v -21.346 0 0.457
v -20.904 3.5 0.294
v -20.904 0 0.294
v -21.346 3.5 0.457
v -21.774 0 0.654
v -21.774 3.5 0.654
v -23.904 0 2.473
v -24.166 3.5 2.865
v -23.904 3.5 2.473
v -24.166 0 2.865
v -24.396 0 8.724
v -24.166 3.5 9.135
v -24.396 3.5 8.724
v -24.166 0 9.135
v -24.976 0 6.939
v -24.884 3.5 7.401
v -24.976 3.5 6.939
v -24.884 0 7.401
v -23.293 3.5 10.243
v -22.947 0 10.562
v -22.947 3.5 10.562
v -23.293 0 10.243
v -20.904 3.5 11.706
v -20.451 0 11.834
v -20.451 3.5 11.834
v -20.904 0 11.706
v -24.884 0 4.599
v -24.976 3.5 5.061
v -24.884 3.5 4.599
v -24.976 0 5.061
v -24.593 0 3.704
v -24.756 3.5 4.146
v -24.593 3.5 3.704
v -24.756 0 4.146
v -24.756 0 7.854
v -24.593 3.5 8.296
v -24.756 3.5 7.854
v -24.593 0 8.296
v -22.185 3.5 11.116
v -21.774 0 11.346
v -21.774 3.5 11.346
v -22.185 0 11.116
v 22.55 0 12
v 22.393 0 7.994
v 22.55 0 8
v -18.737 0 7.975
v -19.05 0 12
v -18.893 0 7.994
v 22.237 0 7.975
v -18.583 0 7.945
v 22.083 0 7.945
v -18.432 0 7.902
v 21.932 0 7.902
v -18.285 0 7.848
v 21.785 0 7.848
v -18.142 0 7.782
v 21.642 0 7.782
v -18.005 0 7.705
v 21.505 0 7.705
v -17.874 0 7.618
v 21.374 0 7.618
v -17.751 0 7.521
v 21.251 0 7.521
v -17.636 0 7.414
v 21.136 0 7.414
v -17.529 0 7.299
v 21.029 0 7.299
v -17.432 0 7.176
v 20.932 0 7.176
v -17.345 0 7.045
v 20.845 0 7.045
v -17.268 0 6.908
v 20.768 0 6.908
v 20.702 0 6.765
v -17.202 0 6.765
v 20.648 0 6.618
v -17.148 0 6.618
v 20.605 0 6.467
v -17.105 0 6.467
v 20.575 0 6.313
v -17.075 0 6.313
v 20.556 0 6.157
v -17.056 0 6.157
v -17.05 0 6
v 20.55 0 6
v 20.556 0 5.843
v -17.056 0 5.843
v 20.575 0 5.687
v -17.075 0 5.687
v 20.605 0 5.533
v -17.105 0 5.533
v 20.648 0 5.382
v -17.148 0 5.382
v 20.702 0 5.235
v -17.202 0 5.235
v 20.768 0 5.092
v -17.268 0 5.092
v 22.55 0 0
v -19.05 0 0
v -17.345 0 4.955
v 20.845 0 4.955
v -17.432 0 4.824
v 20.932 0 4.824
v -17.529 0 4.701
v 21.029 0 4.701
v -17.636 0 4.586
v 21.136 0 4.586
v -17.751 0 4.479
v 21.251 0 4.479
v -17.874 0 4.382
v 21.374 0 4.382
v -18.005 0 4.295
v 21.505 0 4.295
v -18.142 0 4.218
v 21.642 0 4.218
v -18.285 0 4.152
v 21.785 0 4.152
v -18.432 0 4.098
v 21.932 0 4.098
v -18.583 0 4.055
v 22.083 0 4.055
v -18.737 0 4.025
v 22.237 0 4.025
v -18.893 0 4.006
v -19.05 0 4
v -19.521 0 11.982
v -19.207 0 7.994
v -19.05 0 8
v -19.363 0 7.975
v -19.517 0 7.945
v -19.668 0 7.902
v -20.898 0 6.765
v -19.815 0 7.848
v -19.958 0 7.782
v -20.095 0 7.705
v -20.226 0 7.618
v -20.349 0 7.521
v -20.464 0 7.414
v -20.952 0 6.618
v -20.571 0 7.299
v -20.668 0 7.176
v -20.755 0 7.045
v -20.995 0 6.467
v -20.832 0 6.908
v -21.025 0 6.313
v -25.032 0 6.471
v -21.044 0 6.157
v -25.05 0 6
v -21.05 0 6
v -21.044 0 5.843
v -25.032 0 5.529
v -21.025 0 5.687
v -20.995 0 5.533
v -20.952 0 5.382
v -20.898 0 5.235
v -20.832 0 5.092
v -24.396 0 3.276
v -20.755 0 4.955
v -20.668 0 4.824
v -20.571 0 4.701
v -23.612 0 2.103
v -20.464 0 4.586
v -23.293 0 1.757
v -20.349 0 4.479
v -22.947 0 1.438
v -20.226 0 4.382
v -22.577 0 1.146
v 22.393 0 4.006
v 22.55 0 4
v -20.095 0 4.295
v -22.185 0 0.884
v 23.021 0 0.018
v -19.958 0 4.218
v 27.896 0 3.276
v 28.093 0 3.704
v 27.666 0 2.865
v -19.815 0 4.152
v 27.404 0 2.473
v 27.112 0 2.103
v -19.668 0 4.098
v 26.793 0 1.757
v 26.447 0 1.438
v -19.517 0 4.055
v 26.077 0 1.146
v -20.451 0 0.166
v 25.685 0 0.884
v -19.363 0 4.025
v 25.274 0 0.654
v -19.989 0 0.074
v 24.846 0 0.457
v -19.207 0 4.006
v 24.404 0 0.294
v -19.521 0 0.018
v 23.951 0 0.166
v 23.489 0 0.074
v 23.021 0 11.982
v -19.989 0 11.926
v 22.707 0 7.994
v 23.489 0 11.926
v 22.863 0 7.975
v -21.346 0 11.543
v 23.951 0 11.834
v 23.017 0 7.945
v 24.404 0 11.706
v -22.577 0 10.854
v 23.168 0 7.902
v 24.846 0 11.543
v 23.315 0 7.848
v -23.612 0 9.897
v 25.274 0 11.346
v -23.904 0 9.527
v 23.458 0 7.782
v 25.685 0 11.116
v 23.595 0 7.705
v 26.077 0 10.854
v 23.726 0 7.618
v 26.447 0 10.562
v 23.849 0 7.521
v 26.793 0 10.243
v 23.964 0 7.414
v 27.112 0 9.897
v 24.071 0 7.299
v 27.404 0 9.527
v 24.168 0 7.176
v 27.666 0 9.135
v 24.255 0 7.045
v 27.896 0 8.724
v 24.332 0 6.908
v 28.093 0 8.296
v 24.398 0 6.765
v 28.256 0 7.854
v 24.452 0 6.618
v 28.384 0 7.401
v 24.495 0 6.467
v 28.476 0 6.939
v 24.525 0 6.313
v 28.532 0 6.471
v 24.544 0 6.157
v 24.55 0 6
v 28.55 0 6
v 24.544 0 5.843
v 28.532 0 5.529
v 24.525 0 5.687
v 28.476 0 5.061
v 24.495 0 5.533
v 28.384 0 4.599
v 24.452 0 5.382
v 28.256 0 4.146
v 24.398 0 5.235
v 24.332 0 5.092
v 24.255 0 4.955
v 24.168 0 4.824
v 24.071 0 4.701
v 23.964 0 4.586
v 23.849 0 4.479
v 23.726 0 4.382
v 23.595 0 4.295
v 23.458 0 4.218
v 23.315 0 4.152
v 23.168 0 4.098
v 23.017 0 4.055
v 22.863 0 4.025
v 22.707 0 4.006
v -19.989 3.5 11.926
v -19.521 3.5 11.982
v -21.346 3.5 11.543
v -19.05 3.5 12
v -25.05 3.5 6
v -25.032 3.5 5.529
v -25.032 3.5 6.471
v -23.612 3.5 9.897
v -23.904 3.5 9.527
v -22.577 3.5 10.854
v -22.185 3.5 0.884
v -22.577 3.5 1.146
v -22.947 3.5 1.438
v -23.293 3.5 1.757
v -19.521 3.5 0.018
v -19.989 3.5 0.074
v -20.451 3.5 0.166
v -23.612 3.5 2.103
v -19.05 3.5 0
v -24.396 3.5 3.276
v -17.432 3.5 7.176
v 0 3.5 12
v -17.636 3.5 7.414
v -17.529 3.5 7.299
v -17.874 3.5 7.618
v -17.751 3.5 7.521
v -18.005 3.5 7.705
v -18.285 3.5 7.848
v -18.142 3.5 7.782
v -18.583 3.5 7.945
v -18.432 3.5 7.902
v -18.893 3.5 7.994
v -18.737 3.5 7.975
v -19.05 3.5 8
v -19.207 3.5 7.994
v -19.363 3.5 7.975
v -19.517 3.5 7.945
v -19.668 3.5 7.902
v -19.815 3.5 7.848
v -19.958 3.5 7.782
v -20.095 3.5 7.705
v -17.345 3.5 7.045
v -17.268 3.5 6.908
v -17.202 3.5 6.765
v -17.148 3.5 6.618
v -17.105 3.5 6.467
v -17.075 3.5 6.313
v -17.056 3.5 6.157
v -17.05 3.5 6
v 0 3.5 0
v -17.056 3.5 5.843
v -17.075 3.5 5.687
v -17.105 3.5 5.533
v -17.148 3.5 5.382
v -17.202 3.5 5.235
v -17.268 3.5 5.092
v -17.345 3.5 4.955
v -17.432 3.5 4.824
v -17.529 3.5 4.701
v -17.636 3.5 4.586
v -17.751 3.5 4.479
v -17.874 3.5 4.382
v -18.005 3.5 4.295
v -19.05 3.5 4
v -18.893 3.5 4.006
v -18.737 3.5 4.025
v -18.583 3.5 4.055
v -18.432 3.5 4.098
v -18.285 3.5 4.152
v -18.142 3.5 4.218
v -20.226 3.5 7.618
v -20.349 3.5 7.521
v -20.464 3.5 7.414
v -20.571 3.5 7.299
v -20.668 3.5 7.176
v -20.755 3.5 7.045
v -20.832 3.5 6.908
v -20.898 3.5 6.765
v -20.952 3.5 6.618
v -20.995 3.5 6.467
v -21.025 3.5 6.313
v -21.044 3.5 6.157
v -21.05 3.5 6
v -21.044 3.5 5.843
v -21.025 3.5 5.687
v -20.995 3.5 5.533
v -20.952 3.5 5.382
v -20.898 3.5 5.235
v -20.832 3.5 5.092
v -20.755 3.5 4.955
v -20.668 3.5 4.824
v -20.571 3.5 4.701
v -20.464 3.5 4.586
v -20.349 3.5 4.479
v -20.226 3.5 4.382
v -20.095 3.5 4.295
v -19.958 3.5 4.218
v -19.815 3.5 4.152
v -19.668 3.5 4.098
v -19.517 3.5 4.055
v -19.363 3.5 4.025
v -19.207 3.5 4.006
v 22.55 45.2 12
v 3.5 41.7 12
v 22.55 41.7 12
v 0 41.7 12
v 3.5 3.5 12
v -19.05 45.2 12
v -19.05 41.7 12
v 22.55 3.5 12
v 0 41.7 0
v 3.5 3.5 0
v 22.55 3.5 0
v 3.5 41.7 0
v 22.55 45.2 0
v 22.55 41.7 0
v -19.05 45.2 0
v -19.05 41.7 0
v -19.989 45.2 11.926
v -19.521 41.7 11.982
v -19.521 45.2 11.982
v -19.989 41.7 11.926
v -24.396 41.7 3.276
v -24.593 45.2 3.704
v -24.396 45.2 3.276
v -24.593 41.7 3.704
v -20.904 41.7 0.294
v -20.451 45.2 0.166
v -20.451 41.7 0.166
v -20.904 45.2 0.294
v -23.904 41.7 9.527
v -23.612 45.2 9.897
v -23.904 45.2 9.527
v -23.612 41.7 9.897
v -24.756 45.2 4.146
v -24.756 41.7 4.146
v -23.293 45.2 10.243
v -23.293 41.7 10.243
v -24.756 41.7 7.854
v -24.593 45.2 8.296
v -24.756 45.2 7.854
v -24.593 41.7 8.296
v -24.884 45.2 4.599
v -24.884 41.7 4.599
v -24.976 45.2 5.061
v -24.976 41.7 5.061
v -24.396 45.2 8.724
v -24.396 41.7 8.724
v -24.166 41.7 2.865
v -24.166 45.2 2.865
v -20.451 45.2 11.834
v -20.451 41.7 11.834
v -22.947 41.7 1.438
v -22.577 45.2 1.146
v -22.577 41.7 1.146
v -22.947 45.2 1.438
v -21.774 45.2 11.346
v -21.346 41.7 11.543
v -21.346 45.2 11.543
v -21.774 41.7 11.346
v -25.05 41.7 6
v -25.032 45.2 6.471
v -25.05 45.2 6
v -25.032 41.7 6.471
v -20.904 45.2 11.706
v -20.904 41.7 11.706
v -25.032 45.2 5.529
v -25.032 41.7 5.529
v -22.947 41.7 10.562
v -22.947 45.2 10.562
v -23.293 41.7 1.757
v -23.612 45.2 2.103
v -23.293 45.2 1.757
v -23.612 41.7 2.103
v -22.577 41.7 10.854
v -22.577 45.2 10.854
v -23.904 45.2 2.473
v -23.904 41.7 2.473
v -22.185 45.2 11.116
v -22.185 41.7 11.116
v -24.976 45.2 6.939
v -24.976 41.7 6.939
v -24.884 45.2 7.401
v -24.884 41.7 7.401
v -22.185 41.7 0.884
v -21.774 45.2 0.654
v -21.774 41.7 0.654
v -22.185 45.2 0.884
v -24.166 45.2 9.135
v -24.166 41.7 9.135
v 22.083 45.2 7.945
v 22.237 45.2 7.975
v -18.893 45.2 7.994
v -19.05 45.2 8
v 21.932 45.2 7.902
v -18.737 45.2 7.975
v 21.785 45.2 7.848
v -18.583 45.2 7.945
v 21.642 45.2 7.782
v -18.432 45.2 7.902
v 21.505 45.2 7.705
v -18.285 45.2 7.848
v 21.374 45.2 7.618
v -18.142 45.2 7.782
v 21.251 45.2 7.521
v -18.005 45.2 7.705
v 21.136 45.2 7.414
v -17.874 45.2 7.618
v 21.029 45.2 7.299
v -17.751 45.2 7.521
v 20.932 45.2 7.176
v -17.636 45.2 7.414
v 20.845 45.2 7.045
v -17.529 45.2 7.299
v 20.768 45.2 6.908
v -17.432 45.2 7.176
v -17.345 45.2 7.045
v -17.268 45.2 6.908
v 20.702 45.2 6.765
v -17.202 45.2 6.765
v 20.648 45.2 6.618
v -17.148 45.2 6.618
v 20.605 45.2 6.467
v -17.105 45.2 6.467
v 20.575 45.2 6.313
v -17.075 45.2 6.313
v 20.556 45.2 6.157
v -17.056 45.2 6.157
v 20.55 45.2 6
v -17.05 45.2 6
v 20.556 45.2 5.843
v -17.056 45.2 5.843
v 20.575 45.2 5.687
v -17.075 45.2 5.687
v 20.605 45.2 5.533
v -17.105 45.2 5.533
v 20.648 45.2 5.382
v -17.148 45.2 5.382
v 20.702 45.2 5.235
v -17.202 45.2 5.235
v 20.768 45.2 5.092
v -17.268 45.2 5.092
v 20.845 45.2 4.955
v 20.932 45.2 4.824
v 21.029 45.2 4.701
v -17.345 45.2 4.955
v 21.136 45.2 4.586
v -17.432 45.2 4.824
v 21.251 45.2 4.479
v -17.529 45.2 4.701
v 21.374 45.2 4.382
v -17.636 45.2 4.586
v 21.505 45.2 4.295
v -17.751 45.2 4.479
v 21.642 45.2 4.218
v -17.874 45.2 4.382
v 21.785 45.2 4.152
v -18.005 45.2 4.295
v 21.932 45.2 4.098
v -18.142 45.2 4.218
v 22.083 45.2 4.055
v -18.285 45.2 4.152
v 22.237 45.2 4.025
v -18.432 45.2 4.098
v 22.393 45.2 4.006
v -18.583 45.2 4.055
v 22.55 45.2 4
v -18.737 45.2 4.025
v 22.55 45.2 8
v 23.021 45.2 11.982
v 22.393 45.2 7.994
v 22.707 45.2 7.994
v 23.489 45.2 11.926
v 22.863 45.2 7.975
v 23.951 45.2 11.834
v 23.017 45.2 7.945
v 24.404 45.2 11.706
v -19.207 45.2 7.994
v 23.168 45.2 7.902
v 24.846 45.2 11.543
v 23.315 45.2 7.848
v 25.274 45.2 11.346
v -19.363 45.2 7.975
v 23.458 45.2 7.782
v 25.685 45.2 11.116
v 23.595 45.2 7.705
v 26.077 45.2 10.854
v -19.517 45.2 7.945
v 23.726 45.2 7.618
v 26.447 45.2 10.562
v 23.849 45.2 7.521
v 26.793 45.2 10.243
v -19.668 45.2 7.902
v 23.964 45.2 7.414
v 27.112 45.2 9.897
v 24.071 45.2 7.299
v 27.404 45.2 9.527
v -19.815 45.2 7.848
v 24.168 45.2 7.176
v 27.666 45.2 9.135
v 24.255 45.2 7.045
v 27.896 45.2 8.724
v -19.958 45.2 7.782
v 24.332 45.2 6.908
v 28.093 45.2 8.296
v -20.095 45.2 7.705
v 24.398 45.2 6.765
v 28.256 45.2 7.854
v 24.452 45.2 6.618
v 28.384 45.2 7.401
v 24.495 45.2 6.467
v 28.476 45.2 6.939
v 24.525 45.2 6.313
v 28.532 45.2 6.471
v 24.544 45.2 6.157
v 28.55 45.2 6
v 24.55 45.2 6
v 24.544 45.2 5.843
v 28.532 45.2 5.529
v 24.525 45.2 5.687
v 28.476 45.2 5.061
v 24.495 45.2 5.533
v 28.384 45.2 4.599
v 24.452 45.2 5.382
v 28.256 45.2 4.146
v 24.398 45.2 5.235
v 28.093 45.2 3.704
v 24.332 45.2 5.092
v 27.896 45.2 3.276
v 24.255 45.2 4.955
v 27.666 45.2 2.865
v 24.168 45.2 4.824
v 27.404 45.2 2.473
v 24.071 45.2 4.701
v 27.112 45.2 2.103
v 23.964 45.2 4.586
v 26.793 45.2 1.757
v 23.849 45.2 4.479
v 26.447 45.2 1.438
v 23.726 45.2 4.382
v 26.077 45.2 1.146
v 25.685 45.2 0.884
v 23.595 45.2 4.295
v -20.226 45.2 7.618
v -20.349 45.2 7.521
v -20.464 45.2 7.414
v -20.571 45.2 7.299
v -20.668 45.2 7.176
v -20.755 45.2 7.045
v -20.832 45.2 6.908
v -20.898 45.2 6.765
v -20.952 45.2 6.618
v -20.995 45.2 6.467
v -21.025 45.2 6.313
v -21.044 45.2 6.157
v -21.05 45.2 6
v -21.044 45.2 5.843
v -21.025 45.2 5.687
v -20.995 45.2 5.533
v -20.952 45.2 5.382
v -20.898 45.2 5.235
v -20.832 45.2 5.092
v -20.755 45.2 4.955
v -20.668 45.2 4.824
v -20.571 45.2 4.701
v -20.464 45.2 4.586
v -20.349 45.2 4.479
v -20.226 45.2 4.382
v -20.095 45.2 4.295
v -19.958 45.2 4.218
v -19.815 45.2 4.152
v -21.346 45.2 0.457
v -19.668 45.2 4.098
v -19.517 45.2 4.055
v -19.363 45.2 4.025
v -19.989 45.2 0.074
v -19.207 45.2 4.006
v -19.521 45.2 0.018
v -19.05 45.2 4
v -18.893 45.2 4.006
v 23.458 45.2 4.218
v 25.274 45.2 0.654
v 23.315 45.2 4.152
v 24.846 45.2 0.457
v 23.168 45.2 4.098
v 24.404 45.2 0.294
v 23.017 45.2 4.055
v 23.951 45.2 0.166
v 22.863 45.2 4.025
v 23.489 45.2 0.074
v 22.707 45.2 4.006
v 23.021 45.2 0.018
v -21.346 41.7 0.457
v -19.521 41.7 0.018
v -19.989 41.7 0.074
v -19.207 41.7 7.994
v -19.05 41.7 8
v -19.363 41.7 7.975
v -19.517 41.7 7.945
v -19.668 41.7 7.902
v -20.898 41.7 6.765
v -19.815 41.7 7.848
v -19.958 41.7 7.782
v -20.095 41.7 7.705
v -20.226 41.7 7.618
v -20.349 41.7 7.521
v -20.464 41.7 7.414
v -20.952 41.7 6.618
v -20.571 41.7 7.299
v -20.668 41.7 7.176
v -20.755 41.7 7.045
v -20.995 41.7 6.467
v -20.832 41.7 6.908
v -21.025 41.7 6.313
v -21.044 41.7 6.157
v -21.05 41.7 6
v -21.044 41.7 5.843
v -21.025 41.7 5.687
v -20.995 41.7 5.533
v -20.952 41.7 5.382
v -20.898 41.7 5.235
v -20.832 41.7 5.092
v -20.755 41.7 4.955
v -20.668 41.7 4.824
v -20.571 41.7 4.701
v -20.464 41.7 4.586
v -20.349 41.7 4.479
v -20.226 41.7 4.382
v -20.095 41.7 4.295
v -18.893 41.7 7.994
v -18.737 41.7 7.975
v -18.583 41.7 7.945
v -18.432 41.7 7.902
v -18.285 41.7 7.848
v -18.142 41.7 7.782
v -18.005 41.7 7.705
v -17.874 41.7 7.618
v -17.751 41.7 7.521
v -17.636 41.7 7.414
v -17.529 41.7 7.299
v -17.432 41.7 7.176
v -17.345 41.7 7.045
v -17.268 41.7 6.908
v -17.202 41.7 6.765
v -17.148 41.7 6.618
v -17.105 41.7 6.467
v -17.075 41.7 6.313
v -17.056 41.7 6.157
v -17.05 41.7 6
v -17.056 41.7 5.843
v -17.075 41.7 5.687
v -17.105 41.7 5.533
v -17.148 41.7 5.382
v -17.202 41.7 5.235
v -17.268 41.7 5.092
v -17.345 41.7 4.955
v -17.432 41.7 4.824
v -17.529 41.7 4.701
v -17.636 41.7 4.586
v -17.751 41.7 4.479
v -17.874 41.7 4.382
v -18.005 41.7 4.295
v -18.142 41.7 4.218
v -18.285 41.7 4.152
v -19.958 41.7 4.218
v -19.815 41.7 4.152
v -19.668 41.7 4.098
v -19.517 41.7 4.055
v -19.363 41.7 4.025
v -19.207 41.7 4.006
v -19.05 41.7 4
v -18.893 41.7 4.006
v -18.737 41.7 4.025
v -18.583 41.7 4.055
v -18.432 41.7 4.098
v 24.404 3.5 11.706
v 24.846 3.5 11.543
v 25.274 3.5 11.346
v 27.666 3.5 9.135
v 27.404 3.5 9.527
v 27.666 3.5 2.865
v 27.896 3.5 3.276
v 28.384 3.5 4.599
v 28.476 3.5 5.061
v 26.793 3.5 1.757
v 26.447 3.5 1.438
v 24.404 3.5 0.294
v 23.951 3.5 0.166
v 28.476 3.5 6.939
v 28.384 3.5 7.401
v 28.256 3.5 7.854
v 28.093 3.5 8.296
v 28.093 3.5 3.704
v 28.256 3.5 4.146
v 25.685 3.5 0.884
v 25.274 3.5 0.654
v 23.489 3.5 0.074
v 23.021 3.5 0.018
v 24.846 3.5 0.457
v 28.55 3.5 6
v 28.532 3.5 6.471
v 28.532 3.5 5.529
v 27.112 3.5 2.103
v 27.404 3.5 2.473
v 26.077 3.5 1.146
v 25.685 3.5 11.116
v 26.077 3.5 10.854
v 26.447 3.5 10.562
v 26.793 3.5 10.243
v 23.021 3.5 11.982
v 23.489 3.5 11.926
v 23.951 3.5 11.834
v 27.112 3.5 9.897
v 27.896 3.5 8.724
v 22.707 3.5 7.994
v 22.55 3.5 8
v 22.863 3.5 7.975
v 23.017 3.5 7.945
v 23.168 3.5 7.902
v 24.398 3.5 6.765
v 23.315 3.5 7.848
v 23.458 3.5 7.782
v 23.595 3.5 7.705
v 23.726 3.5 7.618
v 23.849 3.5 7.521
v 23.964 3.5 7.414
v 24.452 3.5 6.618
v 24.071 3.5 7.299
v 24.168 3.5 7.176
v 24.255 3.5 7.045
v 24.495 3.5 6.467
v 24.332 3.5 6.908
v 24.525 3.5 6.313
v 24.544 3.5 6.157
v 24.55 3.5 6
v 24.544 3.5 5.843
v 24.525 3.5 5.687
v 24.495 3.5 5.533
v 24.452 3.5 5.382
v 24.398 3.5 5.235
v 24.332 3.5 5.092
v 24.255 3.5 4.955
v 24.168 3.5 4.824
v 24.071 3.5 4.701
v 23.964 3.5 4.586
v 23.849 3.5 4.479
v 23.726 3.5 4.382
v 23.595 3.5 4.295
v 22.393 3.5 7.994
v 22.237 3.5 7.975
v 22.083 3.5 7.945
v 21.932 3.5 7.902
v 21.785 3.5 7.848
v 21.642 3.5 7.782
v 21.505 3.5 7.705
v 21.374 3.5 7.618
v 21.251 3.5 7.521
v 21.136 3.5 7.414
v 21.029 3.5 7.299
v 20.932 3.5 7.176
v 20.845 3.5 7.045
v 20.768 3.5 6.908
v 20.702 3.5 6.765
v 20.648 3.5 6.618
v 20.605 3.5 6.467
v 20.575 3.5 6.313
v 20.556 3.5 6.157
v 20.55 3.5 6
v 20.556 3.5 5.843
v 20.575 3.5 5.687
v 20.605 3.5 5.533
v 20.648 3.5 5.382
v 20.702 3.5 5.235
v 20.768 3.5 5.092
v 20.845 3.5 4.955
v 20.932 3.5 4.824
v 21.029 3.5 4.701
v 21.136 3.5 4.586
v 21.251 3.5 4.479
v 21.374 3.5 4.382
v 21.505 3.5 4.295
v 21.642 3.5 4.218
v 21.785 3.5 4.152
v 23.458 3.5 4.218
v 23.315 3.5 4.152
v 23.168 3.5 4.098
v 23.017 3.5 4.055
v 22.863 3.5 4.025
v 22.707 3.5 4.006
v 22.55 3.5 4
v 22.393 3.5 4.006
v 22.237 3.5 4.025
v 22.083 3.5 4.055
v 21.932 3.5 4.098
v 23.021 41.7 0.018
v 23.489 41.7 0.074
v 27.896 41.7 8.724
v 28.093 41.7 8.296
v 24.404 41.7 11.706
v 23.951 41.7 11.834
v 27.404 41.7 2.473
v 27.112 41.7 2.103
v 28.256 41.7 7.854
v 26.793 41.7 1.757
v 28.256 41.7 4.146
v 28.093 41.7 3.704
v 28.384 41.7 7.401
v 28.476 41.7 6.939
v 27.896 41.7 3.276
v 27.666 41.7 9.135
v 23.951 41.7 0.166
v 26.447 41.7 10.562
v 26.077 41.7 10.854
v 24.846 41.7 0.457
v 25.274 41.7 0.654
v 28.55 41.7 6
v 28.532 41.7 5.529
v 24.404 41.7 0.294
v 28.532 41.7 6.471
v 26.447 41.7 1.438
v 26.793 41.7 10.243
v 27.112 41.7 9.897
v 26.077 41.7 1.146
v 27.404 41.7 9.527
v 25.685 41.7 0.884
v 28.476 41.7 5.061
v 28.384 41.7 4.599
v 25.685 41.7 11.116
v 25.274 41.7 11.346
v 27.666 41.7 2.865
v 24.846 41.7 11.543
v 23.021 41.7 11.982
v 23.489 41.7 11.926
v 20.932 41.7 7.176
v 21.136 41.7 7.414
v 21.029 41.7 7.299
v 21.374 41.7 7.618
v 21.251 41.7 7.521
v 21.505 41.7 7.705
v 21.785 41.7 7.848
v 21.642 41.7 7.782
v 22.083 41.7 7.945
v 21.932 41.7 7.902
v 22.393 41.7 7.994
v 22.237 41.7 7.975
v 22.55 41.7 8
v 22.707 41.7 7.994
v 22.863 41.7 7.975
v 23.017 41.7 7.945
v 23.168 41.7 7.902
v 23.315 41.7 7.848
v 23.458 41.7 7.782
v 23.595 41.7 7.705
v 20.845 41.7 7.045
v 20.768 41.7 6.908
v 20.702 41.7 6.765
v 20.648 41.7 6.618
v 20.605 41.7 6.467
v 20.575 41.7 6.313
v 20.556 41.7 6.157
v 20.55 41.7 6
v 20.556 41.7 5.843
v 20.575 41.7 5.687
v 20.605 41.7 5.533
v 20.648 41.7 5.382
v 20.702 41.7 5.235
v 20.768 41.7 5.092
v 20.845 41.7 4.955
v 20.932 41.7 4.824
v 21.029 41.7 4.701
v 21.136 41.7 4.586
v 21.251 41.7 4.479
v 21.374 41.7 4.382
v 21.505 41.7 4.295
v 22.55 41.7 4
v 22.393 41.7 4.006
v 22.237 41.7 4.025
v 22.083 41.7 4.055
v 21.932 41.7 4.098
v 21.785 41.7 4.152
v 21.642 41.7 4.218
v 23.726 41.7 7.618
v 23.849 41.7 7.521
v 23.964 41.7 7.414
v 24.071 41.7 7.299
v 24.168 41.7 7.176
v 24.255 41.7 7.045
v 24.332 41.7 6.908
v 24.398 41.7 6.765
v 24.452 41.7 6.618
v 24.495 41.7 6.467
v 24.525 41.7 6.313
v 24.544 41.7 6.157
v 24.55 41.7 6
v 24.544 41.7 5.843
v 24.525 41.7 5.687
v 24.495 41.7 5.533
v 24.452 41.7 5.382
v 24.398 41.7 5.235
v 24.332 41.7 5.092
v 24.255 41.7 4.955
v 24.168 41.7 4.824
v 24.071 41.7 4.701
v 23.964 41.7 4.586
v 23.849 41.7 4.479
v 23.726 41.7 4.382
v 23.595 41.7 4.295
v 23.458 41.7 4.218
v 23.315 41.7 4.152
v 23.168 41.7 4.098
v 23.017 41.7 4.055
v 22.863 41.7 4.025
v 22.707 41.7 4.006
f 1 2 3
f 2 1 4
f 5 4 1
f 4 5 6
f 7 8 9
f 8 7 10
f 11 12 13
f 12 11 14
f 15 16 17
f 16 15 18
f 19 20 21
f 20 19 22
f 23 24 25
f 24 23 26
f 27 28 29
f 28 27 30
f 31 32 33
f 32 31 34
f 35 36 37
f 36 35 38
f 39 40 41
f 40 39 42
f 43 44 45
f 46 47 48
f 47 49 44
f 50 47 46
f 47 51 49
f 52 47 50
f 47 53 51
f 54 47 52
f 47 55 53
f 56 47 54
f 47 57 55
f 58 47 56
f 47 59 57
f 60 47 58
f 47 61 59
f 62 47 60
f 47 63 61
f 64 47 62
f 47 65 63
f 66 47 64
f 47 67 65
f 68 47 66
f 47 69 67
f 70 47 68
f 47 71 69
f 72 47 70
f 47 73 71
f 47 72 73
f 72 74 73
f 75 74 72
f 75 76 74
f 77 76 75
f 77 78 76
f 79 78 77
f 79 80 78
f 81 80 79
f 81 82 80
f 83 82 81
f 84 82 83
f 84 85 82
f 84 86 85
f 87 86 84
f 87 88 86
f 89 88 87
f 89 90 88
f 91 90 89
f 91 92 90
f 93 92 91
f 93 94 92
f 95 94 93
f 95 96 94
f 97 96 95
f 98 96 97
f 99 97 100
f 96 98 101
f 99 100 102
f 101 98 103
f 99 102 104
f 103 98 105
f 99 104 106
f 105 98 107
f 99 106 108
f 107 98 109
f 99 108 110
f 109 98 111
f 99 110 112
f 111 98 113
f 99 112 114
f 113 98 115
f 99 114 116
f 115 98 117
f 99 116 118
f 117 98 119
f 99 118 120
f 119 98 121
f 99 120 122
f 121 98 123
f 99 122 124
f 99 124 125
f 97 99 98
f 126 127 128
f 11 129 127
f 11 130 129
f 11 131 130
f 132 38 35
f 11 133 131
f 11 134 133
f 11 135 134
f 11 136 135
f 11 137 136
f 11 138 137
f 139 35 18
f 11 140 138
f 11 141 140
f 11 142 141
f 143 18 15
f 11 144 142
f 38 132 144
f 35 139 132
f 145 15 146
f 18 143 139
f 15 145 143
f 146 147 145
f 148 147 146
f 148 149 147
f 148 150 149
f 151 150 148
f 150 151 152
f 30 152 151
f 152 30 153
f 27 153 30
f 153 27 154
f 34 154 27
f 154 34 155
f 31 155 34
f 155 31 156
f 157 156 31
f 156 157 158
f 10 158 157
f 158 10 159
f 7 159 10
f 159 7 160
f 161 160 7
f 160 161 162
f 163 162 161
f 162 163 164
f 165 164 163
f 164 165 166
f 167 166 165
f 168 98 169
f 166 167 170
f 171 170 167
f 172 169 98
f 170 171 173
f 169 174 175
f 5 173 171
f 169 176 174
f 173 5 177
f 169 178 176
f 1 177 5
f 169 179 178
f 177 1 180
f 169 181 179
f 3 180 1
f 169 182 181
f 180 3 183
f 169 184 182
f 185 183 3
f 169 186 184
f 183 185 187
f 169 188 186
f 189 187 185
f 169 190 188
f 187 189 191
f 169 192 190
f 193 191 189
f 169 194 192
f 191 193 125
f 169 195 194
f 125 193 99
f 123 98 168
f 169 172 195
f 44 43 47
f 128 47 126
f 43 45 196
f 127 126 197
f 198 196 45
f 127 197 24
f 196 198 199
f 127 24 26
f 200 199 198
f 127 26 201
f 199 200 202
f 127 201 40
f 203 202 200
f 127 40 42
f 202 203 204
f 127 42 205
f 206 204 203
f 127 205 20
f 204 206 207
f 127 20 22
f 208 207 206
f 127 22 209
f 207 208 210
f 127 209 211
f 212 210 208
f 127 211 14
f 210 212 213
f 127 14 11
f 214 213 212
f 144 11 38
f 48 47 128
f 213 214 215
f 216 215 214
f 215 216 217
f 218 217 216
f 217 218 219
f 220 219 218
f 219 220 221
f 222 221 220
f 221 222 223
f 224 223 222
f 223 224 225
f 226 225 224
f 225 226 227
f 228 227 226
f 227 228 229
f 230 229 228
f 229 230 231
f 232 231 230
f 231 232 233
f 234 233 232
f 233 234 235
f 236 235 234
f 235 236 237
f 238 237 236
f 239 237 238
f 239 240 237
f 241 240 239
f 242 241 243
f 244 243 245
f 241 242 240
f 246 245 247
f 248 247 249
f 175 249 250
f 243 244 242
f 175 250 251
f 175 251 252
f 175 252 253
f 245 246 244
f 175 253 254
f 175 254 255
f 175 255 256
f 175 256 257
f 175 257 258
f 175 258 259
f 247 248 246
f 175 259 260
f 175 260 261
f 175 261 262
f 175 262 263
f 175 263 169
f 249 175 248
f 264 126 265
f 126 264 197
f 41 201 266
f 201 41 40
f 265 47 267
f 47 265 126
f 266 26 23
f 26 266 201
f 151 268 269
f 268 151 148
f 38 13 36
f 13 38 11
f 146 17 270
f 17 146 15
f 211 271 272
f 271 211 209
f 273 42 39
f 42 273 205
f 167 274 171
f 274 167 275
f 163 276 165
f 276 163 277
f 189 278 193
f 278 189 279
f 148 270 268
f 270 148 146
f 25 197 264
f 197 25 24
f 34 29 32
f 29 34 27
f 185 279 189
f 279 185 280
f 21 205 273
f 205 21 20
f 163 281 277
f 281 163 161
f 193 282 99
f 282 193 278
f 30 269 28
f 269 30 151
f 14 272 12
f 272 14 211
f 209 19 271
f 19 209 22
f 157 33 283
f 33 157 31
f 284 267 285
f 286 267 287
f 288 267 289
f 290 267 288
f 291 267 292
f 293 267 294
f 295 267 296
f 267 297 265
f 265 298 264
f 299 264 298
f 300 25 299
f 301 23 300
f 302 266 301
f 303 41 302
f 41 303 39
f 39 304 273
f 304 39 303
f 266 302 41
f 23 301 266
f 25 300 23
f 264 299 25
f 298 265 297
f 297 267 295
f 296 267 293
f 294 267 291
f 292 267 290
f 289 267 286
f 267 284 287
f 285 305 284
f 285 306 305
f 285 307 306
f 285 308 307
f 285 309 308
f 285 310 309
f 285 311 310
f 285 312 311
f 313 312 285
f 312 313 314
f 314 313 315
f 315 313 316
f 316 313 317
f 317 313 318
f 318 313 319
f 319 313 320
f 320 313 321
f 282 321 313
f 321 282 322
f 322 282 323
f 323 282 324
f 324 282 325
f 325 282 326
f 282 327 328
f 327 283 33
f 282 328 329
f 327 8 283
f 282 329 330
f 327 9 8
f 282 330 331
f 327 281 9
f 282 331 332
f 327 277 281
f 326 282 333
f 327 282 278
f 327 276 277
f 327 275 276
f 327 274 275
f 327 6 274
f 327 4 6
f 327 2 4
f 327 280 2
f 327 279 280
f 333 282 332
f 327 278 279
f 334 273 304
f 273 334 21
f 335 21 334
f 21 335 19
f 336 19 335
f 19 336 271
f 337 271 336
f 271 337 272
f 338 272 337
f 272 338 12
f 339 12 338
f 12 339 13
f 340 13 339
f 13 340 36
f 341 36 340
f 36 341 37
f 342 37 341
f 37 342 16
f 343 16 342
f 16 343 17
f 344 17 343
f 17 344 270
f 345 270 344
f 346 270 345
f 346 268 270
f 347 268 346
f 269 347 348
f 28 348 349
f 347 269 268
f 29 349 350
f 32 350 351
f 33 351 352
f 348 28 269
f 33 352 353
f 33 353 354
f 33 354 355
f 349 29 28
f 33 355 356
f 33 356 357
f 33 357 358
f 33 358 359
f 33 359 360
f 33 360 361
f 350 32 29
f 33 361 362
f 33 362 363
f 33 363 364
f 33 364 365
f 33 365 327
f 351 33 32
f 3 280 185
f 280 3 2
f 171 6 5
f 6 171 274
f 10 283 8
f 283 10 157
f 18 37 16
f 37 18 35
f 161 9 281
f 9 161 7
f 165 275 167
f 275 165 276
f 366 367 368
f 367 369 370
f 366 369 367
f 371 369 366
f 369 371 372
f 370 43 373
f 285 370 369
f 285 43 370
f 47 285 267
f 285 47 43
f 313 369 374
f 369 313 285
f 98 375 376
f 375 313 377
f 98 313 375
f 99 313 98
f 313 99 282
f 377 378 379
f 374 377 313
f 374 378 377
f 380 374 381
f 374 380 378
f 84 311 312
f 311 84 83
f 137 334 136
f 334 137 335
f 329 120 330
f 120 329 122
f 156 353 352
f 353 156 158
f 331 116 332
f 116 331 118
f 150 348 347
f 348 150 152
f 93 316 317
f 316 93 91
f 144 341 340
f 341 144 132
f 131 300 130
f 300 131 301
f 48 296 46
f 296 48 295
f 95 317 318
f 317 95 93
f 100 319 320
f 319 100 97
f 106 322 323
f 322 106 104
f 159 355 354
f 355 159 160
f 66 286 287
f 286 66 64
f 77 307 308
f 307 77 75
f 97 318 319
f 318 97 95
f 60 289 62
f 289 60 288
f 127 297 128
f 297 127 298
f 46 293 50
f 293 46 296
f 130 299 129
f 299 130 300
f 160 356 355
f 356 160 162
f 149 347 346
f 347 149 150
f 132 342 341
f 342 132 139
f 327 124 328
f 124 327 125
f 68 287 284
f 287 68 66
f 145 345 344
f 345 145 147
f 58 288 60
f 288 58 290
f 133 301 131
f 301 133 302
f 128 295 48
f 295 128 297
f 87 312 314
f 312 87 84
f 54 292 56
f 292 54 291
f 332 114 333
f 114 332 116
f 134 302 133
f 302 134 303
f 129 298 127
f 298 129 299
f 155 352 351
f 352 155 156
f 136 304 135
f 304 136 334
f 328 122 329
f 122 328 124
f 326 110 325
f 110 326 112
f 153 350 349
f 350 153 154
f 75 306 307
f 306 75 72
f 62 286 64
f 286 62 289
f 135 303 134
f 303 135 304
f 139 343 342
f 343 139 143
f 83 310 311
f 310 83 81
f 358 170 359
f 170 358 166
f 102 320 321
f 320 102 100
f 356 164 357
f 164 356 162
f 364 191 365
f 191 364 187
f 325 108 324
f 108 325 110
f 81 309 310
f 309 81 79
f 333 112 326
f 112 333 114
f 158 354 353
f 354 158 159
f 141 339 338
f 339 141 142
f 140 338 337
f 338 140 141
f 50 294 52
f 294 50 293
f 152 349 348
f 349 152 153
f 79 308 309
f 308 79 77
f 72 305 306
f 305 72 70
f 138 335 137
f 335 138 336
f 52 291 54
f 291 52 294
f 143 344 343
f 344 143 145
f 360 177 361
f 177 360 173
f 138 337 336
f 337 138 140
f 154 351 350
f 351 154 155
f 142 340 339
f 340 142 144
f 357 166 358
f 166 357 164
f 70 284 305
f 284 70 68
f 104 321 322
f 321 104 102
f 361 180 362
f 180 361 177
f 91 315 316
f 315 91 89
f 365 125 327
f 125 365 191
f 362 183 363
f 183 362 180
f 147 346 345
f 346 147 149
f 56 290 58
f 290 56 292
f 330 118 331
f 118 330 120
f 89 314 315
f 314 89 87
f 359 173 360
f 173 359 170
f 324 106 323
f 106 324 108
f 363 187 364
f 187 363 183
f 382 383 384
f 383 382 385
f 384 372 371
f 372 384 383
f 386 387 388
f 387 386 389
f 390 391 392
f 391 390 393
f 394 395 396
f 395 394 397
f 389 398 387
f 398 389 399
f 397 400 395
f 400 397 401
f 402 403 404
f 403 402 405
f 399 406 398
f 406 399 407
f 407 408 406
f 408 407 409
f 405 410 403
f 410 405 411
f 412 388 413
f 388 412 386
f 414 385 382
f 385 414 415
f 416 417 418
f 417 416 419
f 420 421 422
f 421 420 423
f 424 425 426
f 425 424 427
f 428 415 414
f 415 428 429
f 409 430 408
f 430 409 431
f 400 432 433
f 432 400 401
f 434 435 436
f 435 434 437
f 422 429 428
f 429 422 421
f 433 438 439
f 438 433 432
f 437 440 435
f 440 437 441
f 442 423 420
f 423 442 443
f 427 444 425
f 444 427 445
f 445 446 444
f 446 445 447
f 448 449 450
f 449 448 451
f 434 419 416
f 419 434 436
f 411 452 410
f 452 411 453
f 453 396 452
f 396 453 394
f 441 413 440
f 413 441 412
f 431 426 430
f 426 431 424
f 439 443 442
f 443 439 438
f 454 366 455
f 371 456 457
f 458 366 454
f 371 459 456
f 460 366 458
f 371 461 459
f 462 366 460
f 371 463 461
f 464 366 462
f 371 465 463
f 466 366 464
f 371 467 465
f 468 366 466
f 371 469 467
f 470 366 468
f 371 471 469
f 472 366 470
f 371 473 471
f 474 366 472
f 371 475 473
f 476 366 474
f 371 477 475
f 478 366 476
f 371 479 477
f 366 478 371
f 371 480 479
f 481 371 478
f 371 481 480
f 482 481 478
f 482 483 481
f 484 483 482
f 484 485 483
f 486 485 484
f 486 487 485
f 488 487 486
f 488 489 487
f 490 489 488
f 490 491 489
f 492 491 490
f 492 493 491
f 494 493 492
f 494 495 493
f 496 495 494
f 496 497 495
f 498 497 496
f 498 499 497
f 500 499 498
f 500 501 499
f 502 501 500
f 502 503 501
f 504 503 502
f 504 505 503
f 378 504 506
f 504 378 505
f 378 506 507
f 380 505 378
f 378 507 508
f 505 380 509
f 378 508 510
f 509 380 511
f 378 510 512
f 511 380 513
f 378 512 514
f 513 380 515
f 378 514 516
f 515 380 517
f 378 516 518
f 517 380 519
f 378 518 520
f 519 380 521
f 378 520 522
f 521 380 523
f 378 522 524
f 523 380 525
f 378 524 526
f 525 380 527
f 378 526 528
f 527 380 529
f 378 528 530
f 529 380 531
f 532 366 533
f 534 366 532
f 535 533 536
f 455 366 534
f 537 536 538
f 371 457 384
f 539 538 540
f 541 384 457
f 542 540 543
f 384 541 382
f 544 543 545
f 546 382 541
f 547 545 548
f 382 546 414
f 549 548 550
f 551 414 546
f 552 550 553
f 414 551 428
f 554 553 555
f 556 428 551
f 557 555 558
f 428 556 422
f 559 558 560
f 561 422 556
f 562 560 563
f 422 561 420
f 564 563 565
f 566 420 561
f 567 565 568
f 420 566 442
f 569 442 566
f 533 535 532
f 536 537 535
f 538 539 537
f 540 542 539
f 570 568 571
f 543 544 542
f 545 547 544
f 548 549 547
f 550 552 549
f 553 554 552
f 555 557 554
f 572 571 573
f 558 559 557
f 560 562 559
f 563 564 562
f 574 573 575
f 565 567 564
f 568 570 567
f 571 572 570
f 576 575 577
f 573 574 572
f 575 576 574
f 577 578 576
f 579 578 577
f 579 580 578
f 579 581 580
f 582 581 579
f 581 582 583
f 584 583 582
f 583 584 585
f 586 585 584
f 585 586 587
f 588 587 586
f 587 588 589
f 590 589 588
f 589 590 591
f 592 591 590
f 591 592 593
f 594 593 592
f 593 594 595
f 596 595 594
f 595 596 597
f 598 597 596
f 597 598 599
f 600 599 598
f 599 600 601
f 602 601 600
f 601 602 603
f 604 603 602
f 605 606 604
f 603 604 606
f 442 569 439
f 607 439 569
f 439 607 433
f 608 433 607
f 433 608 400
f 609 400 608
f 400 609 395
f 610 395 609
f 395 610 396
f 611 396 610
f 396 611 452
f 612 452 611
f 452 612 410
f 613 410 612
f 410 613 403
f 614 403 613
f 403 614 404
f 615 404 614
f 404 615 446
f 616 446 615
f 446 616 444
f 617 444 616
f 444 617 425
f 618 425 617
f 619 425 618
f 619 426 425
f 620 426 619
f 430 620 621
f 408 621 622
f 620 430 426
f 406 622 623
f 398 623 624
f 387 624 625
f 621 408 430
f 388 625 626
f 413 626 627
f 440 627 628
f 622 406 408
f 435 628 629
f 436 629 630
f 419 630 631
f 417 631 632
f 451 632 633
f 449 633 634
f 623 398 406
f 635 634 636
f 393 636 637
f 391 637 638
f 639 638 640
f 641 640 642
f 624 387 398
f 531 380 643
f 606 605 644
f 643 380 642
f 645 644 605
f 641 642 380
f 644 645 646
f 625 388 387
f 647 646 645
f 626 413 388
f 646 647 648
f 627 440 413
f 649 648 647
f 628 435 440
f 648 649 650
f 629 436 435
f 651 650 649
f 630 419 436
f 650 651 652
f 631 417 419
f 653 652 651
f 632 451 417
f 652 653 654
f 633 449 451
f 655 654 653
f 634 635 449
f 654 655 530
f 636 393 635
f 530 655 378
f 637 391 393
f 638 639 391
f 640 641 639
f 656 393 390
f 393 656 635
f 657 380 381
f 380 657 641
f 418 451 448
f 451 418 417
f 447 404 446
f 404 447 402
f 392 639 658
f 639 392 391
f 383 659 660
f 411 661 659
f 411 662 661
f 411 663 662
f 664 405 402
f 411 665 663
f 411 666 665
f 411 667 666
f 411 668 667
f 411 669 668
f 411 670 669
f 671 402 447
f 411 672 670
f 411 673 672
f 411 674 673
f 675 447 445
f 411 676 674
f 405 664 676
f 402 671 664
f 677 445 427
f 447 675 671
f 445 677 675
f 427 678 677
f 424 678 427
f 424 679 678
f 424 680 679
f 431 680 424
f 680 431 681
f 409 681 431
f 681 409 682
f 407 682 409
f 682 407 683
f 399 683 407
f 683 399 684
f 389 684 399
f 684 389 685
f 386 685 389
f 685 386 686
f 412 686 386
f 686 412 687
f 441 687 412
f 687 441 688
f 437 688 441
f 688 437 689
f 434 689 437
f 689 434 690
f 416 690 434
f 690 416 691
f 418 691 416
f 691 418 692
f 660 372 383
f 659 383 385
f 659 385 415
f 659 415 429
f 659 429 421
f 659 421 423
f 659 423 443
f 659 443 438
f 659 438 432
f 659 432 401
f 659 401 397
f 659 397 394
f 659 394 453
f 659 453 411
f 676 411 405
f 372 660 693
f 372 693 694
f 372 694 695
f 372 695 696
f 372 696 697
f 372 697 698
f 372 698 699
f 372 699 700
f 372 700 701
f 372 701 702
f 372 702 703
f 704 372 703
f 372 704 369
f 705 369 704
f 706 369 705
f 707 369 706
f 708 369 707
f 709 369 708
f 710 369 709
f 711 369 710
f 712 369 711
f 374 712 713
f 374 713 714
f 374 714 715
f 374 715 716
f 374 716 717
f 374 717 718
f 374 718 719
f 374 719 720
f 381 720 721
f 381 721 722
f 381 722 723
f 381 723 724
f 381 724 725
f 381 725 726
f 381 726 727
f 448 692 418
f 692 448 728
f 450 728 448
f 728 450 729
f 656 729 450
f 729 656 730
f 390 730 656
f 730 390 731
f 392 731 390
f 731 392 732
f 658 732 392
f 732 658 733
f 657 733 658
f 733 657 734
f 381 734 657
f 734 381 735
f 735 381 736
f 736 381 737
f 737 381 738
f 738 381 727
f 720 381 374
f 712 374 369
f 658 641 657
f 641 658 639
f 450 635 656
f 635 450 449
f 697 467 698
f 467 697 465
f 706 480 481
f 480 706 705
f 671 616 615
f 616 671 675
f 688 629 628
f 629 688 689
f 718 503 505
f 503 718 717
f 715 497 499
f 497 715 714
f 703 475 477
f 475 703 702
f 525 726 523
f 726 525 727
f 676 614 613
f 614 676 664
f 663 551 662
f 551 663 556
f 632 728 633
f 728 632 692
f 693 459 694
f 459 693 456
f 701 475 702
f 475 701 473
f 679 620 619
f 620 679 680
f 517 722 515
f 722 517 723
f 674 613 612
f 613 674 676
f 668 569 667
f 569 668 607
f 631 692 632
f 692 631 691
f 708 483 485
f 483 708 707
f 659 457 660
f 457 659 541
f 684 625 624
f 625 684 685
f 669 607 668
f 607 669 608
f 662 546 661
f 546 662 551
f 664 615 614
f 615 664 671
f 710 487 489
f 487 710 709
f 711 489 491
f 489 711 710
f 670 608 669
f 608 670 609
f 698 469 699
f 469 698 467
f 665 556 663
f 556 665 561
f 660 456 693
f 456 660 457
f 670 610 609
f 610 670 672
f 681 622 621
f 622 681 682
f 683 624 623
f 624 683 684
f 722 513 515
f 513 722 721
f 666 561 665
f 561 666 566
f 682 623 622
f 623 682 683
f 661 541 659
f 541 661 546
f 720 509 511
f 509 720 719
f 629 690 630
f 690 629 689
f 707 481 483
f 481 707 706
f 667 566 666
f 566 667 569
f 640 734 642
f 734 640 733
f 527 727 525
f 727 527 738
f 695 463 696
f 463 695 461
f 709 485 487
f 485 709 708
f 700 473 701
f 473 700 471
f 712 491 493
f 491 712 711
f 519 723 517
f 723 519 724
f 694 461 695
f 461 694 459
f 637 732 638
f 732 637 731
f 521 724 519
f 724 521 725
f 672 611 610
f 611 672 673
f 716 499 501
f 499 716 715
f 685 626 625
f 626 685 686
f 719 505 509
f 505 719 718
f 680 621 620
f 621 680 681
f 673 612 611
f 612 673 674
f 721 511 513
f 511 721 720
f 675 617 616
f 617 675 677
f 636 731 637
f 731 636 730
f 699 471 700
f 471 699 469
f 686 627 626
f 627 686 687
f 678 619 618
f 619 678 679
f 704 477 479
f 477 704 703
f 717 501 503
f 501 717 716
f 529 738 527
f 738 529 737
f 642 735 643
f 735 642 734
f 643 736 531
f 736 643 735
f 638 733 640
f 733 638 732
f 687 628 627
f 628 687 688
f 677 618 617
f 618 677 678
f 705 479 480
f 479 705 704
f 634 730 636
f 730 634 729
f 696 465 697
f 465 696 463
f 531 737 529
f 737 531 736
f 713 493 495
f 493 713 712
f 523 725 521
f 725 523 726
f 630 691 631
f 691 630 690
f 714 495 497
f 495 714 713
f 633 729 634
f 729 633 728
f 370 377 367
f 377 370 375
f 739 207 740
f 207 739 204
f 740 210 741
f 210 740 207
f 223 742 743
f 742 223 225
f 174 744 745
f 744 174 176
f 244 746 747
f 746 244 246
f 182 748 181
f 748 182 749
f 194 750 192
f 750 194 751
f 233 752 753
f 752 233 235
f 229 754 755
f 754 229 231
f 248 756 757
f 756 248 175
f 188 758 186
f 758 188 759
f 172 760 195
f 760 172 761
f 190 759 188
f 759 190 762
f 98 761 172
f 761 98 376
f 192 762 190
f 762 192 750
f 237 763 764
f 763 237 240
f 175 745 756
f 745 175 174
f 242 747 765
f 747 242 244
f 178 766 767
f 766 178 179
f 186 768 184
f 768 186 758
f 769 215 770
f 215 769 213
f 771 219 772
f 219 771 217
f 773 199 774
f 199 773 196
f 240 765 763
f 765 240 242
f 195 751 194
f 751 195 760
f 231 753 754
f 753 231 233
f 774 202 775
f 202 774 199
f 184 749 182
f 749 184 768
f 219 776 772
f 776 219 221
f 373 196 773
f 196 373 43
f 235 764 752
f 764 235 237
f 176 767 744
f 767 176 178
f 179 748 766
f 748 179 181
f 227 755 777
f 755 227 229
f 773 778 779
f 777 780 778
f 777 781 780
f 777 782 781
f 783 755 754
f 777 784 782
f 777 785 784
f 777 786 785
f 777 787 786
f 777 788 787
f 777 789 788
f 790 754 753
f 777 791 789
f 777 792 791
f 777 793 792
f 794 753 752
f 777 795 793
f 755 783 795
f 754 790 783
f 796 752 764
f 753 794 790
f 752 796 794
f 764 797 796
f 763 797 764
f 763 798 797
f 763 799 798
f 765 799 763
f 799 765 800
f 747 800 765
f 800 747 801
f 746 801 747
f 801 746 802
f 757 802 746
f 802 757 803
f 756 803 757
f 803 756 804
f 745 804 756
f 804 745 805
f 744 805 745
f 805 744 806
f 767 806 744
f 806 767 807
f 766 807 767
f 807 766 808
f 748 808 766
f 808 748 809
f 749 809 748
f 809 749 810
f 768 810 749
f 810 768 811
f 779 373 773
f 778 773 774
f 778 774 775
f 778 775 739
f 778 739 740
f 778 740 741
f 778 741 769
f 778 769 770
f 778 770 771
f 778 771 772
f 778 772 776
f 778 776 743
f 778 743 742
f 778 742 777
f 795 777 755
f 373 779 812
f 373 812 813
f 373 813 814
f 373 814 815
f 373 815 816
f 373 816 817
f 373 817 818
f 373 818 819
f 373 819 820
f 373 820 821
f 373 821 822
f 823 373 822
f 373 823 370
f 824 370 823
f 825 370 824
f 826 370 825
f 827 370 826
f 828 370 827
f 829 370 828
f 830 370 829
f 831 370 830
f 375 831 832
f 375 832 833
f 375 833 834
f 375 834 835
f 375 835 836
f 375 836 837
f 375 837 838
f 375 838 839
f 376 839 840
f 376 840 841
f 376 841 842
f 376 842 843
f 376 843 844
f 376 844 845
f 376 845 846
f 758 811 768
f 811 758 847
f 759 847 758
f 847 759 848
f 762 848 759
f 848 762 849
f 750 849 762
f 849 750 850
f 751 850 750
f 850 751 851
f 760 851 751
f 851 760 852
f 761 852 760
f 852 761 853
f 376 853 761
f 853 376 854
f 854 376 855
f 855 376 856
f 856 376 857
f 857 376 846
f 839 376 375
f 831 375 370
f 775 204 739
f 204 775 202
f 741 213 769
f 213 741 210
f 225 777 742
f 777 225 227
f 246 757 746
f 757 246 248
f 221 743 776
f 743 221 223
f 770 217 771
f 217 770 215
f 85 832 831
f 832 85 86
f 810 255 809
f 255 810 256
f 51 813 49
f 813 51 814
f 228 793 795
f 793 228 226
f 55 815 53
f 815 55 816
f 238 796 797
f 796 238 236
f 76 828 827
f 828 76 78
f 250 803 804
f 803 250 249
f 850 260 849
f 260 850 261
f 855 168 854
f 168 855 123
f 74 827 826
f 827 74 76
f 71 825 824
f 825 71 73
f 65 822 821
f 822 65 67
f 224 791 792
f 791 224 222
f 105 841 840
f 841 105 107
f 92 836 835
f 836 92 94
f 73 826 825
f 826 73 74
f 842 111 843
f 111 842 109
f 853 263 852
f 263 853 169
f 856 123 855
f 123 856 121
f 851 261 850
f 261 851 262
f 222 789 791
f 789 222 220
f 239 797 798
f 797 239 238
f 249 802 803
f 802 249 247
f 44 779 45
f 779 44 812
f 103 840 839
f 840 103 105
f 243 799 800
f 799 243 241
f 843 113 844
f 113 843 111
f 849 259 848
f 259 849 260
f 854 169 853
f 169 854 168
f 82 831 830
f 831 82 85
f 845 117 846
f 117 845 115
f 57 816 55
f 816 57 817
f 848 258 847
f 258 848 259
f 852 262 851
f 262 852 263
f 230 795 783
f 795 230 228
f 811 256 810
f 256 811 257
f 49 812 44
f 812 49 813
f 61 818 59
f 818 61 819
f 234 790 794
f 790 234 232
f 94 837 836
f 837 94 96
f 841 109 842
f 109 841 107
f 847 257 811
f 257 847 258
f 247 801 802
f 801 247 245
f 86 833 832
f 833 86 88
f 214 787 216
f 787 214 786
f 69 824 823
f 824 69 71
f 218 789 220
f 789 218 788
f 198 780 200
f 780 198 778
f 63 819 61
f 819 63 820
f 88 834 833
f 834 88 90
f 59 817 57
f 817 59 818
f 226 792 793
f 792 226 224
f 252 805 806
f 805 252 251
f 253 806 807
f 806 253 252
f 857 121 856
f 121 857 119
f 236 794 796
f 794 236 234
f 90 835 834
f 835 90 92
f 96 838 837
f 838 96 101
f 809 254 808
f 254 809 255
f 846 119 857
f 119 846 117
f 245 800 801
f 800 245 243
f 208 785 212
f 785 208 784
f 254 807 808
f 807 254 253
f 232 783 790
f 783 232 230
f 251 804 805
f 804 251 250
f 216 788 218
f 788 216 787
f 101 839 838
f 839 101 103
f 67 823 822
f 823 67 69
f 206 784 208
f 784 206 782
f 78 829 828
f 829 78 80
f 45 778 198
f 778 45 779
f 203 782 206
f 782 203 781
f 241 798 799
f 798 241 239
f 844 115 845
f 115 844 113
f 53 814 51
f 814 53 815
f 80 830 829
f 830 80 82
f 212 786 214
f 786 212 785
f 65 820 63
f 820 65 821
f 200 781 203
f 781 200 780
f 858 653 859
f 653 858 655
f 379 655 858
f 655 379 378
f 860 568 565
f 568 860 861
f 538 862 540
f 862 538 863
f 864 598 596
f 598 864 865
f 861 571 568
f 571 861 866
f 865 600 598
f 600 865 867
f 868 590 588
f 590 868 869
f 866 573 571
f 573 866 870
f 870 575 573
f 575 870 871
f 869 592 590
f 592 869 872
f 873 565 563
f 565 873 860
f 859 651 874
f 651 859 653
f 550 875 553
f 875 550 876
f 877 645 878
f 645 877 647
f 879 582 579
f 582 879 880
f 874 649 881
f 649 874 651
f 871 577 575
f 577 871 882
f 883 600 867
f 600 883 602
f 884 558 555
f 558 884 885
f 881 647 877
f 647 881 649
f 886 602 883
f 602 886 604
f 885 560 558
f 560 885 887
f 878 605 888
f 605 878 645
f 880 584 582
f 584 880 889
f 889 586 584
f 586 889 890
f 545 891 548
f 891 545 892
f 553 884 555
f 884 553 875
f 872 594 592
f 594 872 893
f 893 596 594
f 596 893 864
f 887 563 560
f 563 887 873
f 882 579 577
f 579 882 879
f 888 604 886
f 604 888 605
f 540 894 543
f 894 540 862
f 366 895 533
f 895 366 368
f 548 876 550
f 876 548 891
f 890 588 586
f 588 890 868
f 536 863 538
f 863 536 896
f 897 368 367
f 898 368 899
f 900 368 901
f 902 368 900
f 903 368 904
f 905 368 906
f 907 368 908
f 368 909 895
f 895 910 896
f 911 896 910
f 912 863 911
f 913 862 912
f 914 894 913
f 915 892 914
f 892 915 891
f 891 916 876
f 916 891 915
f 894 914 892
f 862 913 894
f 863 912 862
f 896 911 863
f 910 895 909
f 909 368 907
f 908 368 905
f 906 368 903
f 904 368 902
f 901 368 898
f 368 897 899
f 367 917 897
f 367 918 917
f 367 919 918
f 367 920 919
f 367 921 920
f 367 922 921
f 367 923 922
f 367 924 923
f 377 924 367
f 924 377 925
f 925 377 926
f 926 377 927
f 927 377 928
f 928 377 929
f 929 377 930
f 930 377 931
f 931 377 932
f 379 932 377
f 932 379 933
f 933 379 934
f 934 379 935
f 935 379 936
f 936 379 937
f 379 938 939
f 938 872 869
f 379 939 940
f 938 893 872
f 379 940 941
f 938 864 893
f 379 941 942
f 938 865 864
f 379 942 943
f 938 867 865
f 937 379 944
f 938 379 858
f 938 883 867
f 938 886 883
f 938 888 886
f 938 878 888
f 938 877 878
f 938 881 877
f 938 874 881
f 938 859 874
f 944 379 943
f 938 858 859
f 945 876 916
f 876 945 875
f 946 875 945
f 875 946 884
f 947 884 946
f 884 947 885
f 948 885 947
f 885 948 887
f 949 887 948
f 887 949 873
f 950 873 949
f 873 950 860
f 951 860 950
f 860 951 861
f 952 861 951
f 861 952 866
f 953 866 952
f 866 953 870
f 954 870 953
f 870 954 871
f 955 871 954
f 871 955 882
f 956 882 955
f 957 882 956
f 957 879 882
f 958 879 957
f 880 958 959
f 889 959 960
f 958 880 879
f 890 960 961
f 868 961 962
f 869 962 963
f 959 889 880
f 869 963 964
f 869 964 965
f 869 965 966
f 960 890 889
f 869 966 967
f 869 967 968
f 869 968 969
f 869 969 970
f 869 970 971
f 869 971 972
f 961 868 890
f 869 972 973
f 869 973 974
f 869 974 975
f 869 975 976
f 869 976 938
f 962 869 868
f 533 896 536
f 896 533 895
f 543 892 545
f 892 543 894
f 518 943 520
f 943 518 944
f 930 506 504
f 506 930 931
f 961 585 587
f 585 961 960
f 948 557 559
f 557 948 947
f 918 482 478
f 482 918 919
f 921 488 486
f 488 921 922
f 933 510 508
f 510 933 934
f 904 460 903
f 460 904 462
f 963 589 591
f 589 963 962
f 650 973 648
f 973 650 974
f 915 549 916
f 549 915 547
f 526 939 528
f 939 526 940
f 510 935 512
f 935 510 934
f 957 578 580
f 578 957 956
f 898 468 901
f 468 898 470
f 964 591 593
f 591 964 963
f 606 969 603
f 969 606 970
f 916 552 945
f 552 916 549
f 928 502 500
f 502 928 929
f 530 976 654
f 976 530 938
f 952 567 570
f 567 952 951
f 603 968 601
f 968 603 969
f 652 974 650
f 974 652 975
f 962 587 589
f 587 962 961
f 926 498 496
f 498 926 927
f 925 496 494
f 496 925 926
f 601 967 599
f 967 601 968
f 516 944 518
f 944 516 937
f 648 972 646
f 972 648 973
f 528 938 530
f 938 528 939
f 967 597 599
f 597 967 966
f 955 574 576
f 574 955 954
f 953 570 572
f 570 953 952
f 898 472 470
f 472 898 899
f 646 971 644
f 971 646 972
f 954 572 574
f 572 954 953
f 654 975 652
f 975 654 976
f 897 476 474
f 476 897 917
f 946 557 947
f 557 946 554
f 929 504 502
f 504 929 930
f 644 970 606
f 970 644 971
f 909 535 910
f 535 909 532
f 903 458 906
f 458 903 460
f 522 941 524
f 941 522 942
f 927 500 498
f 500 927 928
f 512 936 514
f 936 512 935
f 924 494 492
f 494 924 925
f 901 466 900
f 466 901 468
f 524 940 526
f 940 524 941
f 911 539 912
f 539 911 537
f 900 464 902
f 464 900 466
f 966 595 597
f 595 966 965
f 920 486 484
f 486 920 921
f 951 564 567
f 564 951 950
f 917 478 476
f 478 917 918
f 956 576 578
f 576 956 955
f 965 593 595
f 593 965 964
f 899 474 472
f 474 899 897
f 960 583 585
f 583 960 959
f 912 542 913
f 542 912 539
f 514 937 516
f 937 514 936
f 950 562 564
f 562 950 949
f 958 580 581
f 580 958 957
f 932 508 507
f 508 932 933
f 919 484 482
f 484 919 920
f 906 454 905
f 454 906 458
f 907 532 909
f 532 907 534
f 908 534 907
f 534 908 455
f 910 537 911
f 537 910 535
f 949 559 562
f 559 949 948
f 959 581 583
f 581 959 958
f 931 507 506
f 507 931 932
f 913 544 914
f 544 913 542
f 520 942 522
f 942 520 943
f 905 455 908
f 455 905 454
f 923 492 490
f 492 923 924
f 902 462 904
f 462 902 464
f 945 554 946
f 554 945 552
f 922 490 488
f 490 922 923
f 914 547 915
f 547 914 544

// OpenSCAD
// file: servo_bracket_modules.scad
//standard hobby servo dimensions - measured by hand
A = 19.82;
B = 13.47;
C = 33.79;
D = 10.17;
E = 9.66;
F = 30.22;
G = 11.68;
H = 26.67;
J = 52.84;

//guesses
K=5.8;
M=40;
X=3.5;

//mini hobby servo dimensions
A = 12.7;
B = 8.5;
C = 28.6 - B;
D = 0;
E = 6;
F = 24 - E;
G = 10.6;
H = 15.6;
J = 32.1;
K = G;
M = 23.4;
X = 3;

//thickness of the bracket parts
thickness = 3.5;

module pinhole( x, y, z ){
	translate([x,y,z]){
		rotate(90,[1,0,0]){
			cylinder(h=thickness+2,r=1, $fn=10);
		}
	}
}

module pivothole( x, y, z ){

	translate([x,y,z]){
		rotate(90,[1,0,0]){
			cylinder(h=thickness+2,r=2, $fn=80);
		}
	}
}

module mountpoint( x, y, z ){
		//one pivot hole in the center
		pivothole( x, y, z );

		//four mount holes
		/*
		pinhole_distance = 4.5;
		pinhole( x+pinhole_distance, y, z );
		pinhole( x-pinhole_distance, y, z );
		pinhole( x, y, z+pinhole_distance );
		pinhole( x, y, z-pinhole_distance );
		*/
}

module servo_bracket()
{

//cleaning up the messy variable names a little
extra_length = 10;
bracket_length = B + C + extra_length;

bracket_depth = H;

bracket_height = A;

servo_hole_length = E + F;

	//front plate
	//======
	difference(){
		cube( size=[ bracket_length, thickness, bracket_height + thickness ] );

		//hole that the servo fits into
		translate( [ ( bracket_length - servo_hole_length )/2, -thickness/2, 0 ] ){
			cube( size=[ servo_hole_length, thickness*2,  bracket_height ] );
		}

		translate( [ 0, thickness+1, 0] ){
			//two mounting holes
			pivothole( 5.4, 0, bracket_height/2 );
			pivothole( bracket_length-5.4, 0, bracket_height/2 );
		}
	}


	//back plate
	//======
	difference(){
		translate( [0, bracket_depth + thickness, 0] ){
			cube( size=[ bracket_length, thickness, bracket_height + thickness ] );
		}

		//pivot holes behind servo
		translate( [ 0, 0, 0 ] ){
			mountpoint( B+5, bracket_depth + thickness*3, bracket_height/2 );
			mountpoint( (bracket_length)-(B+5), bracket_depth + thickness*3,  bracket_height/2 );
		}
	}

	//base
	//======
	difference(){
		union(){
			translate( [ 0, 0, -thickness ] ){
				cube( size=[ bracket_length, bracket_depth + (thickness*2), thickness ] );
			}
		}

		//make a hole in the base
		translate( [ ( bracket_length - servo_hole_length )/2, bracket_depth + thickness, -thickness*2] ){
			rotate( 90, [1,0,0]){
				cube( size=[ servo_hole_length, thickness*2, bracket_height + thickness ] );
			}
		}

	}

	//top
	//======
	difference(){
		union(){
			translate( [ 0, 0, bracket_height ] ){
				cube( size=[ bracket_length, bracket_depth + (thickness*2), thickness ] );
			}
		}

		//make a hole in the top
		translate( [ ( bracket_length - servo_hole_length )/2, bracket_depth + thickness, bracket_height - thickness] ){
			rotate( 90, [1,0,0]){
				cube( size=[ servo_hole_length, thickness*2, bracket_height + thickness ] );
			}
		}
	}
}


module servo_bracket_C()
{

//length of the bracket (fudge takes into account extra room for horns, washers, etc)
fudge=2;
bracket_length = H+G+X+(thickness*2)+(thickness*2)+fudge;

//heigh of the bracket
bracket_height = A*1.5;

//width of the bracket
//bracket_width = B*2;  //thicker bracket
bracket_width = E*2;  //thinner bracket

	//front plate
	//======
	difference(){
		union(){
			translate( [ bracket_width/2, thickness, bracket_height ] ){
				rotate( 90, [ 1, 0, 0 ] ){
					cylinder( h=thickness, r=bracket_width/2, $fn=80 );
				}
			}
			cube( size=[ bracket_width, thickness, bracket_height ] );
		}

		mountpoint( bracket_width/2, thickness+1, bracket_height );
	}

	//back plate
	//======
	difference(){
		union(){
			translate( [ bracket_width/2, bracket_length, bracket_height ] ){
				rotate( 90, [ 1, 0, 0 ] ){
					cylinder( h=thickness, r=bracket_width/2, $fn=80 );
				}
			}
			translate( [ 0, bracket_length-thickness, 0 ] ){
				cube( size=[ bracket_width, thickness, bracket_height ] );
			}
		}

		//mount point behind servo
		mountpoint( bracket_width/2, bracket_length+1, bracket_height );
	}

	//base
	//======
	difference(){
		translate( [ 0, 0, -thickness ] ){
			cube( size=[ bracket_width, bracket_length, thickness ] );
		}
		/*
		rotate( 90, [ 1, 0, 0 ] ){
			mountpoint( bracket_width/2, 1, -bracket_length/2 );
		}
		*/
	}

}


module mockup(){
	servo_bracket();

	
	translate( [ -thickness, -thickness*3, E*2 ] ){
		rotate( 90, [0,1,0] ){
			servo_bracket_C();
		}
	}
	
}

//mockup();

//servo_bracket();
// main file
include <servo_bracket_modules.scad>


module servo_bracket_upper_leg(){

	difference(){
		union(){
			//C bracket connects to lower leg
			translate( [0, 0, 0 ] ){
				rotate( -90, [0,1,0] ){
					servo_bracket_C();
				}
			}

			//C bracket connects to hip
			translate( [ thickness, 0, B+thickness ] ){
				rotate( 90, [0,1,0] ){
					servo_bracket_C();
				}
			}
		}
	}

}

servo_bracket_upper_leg();
